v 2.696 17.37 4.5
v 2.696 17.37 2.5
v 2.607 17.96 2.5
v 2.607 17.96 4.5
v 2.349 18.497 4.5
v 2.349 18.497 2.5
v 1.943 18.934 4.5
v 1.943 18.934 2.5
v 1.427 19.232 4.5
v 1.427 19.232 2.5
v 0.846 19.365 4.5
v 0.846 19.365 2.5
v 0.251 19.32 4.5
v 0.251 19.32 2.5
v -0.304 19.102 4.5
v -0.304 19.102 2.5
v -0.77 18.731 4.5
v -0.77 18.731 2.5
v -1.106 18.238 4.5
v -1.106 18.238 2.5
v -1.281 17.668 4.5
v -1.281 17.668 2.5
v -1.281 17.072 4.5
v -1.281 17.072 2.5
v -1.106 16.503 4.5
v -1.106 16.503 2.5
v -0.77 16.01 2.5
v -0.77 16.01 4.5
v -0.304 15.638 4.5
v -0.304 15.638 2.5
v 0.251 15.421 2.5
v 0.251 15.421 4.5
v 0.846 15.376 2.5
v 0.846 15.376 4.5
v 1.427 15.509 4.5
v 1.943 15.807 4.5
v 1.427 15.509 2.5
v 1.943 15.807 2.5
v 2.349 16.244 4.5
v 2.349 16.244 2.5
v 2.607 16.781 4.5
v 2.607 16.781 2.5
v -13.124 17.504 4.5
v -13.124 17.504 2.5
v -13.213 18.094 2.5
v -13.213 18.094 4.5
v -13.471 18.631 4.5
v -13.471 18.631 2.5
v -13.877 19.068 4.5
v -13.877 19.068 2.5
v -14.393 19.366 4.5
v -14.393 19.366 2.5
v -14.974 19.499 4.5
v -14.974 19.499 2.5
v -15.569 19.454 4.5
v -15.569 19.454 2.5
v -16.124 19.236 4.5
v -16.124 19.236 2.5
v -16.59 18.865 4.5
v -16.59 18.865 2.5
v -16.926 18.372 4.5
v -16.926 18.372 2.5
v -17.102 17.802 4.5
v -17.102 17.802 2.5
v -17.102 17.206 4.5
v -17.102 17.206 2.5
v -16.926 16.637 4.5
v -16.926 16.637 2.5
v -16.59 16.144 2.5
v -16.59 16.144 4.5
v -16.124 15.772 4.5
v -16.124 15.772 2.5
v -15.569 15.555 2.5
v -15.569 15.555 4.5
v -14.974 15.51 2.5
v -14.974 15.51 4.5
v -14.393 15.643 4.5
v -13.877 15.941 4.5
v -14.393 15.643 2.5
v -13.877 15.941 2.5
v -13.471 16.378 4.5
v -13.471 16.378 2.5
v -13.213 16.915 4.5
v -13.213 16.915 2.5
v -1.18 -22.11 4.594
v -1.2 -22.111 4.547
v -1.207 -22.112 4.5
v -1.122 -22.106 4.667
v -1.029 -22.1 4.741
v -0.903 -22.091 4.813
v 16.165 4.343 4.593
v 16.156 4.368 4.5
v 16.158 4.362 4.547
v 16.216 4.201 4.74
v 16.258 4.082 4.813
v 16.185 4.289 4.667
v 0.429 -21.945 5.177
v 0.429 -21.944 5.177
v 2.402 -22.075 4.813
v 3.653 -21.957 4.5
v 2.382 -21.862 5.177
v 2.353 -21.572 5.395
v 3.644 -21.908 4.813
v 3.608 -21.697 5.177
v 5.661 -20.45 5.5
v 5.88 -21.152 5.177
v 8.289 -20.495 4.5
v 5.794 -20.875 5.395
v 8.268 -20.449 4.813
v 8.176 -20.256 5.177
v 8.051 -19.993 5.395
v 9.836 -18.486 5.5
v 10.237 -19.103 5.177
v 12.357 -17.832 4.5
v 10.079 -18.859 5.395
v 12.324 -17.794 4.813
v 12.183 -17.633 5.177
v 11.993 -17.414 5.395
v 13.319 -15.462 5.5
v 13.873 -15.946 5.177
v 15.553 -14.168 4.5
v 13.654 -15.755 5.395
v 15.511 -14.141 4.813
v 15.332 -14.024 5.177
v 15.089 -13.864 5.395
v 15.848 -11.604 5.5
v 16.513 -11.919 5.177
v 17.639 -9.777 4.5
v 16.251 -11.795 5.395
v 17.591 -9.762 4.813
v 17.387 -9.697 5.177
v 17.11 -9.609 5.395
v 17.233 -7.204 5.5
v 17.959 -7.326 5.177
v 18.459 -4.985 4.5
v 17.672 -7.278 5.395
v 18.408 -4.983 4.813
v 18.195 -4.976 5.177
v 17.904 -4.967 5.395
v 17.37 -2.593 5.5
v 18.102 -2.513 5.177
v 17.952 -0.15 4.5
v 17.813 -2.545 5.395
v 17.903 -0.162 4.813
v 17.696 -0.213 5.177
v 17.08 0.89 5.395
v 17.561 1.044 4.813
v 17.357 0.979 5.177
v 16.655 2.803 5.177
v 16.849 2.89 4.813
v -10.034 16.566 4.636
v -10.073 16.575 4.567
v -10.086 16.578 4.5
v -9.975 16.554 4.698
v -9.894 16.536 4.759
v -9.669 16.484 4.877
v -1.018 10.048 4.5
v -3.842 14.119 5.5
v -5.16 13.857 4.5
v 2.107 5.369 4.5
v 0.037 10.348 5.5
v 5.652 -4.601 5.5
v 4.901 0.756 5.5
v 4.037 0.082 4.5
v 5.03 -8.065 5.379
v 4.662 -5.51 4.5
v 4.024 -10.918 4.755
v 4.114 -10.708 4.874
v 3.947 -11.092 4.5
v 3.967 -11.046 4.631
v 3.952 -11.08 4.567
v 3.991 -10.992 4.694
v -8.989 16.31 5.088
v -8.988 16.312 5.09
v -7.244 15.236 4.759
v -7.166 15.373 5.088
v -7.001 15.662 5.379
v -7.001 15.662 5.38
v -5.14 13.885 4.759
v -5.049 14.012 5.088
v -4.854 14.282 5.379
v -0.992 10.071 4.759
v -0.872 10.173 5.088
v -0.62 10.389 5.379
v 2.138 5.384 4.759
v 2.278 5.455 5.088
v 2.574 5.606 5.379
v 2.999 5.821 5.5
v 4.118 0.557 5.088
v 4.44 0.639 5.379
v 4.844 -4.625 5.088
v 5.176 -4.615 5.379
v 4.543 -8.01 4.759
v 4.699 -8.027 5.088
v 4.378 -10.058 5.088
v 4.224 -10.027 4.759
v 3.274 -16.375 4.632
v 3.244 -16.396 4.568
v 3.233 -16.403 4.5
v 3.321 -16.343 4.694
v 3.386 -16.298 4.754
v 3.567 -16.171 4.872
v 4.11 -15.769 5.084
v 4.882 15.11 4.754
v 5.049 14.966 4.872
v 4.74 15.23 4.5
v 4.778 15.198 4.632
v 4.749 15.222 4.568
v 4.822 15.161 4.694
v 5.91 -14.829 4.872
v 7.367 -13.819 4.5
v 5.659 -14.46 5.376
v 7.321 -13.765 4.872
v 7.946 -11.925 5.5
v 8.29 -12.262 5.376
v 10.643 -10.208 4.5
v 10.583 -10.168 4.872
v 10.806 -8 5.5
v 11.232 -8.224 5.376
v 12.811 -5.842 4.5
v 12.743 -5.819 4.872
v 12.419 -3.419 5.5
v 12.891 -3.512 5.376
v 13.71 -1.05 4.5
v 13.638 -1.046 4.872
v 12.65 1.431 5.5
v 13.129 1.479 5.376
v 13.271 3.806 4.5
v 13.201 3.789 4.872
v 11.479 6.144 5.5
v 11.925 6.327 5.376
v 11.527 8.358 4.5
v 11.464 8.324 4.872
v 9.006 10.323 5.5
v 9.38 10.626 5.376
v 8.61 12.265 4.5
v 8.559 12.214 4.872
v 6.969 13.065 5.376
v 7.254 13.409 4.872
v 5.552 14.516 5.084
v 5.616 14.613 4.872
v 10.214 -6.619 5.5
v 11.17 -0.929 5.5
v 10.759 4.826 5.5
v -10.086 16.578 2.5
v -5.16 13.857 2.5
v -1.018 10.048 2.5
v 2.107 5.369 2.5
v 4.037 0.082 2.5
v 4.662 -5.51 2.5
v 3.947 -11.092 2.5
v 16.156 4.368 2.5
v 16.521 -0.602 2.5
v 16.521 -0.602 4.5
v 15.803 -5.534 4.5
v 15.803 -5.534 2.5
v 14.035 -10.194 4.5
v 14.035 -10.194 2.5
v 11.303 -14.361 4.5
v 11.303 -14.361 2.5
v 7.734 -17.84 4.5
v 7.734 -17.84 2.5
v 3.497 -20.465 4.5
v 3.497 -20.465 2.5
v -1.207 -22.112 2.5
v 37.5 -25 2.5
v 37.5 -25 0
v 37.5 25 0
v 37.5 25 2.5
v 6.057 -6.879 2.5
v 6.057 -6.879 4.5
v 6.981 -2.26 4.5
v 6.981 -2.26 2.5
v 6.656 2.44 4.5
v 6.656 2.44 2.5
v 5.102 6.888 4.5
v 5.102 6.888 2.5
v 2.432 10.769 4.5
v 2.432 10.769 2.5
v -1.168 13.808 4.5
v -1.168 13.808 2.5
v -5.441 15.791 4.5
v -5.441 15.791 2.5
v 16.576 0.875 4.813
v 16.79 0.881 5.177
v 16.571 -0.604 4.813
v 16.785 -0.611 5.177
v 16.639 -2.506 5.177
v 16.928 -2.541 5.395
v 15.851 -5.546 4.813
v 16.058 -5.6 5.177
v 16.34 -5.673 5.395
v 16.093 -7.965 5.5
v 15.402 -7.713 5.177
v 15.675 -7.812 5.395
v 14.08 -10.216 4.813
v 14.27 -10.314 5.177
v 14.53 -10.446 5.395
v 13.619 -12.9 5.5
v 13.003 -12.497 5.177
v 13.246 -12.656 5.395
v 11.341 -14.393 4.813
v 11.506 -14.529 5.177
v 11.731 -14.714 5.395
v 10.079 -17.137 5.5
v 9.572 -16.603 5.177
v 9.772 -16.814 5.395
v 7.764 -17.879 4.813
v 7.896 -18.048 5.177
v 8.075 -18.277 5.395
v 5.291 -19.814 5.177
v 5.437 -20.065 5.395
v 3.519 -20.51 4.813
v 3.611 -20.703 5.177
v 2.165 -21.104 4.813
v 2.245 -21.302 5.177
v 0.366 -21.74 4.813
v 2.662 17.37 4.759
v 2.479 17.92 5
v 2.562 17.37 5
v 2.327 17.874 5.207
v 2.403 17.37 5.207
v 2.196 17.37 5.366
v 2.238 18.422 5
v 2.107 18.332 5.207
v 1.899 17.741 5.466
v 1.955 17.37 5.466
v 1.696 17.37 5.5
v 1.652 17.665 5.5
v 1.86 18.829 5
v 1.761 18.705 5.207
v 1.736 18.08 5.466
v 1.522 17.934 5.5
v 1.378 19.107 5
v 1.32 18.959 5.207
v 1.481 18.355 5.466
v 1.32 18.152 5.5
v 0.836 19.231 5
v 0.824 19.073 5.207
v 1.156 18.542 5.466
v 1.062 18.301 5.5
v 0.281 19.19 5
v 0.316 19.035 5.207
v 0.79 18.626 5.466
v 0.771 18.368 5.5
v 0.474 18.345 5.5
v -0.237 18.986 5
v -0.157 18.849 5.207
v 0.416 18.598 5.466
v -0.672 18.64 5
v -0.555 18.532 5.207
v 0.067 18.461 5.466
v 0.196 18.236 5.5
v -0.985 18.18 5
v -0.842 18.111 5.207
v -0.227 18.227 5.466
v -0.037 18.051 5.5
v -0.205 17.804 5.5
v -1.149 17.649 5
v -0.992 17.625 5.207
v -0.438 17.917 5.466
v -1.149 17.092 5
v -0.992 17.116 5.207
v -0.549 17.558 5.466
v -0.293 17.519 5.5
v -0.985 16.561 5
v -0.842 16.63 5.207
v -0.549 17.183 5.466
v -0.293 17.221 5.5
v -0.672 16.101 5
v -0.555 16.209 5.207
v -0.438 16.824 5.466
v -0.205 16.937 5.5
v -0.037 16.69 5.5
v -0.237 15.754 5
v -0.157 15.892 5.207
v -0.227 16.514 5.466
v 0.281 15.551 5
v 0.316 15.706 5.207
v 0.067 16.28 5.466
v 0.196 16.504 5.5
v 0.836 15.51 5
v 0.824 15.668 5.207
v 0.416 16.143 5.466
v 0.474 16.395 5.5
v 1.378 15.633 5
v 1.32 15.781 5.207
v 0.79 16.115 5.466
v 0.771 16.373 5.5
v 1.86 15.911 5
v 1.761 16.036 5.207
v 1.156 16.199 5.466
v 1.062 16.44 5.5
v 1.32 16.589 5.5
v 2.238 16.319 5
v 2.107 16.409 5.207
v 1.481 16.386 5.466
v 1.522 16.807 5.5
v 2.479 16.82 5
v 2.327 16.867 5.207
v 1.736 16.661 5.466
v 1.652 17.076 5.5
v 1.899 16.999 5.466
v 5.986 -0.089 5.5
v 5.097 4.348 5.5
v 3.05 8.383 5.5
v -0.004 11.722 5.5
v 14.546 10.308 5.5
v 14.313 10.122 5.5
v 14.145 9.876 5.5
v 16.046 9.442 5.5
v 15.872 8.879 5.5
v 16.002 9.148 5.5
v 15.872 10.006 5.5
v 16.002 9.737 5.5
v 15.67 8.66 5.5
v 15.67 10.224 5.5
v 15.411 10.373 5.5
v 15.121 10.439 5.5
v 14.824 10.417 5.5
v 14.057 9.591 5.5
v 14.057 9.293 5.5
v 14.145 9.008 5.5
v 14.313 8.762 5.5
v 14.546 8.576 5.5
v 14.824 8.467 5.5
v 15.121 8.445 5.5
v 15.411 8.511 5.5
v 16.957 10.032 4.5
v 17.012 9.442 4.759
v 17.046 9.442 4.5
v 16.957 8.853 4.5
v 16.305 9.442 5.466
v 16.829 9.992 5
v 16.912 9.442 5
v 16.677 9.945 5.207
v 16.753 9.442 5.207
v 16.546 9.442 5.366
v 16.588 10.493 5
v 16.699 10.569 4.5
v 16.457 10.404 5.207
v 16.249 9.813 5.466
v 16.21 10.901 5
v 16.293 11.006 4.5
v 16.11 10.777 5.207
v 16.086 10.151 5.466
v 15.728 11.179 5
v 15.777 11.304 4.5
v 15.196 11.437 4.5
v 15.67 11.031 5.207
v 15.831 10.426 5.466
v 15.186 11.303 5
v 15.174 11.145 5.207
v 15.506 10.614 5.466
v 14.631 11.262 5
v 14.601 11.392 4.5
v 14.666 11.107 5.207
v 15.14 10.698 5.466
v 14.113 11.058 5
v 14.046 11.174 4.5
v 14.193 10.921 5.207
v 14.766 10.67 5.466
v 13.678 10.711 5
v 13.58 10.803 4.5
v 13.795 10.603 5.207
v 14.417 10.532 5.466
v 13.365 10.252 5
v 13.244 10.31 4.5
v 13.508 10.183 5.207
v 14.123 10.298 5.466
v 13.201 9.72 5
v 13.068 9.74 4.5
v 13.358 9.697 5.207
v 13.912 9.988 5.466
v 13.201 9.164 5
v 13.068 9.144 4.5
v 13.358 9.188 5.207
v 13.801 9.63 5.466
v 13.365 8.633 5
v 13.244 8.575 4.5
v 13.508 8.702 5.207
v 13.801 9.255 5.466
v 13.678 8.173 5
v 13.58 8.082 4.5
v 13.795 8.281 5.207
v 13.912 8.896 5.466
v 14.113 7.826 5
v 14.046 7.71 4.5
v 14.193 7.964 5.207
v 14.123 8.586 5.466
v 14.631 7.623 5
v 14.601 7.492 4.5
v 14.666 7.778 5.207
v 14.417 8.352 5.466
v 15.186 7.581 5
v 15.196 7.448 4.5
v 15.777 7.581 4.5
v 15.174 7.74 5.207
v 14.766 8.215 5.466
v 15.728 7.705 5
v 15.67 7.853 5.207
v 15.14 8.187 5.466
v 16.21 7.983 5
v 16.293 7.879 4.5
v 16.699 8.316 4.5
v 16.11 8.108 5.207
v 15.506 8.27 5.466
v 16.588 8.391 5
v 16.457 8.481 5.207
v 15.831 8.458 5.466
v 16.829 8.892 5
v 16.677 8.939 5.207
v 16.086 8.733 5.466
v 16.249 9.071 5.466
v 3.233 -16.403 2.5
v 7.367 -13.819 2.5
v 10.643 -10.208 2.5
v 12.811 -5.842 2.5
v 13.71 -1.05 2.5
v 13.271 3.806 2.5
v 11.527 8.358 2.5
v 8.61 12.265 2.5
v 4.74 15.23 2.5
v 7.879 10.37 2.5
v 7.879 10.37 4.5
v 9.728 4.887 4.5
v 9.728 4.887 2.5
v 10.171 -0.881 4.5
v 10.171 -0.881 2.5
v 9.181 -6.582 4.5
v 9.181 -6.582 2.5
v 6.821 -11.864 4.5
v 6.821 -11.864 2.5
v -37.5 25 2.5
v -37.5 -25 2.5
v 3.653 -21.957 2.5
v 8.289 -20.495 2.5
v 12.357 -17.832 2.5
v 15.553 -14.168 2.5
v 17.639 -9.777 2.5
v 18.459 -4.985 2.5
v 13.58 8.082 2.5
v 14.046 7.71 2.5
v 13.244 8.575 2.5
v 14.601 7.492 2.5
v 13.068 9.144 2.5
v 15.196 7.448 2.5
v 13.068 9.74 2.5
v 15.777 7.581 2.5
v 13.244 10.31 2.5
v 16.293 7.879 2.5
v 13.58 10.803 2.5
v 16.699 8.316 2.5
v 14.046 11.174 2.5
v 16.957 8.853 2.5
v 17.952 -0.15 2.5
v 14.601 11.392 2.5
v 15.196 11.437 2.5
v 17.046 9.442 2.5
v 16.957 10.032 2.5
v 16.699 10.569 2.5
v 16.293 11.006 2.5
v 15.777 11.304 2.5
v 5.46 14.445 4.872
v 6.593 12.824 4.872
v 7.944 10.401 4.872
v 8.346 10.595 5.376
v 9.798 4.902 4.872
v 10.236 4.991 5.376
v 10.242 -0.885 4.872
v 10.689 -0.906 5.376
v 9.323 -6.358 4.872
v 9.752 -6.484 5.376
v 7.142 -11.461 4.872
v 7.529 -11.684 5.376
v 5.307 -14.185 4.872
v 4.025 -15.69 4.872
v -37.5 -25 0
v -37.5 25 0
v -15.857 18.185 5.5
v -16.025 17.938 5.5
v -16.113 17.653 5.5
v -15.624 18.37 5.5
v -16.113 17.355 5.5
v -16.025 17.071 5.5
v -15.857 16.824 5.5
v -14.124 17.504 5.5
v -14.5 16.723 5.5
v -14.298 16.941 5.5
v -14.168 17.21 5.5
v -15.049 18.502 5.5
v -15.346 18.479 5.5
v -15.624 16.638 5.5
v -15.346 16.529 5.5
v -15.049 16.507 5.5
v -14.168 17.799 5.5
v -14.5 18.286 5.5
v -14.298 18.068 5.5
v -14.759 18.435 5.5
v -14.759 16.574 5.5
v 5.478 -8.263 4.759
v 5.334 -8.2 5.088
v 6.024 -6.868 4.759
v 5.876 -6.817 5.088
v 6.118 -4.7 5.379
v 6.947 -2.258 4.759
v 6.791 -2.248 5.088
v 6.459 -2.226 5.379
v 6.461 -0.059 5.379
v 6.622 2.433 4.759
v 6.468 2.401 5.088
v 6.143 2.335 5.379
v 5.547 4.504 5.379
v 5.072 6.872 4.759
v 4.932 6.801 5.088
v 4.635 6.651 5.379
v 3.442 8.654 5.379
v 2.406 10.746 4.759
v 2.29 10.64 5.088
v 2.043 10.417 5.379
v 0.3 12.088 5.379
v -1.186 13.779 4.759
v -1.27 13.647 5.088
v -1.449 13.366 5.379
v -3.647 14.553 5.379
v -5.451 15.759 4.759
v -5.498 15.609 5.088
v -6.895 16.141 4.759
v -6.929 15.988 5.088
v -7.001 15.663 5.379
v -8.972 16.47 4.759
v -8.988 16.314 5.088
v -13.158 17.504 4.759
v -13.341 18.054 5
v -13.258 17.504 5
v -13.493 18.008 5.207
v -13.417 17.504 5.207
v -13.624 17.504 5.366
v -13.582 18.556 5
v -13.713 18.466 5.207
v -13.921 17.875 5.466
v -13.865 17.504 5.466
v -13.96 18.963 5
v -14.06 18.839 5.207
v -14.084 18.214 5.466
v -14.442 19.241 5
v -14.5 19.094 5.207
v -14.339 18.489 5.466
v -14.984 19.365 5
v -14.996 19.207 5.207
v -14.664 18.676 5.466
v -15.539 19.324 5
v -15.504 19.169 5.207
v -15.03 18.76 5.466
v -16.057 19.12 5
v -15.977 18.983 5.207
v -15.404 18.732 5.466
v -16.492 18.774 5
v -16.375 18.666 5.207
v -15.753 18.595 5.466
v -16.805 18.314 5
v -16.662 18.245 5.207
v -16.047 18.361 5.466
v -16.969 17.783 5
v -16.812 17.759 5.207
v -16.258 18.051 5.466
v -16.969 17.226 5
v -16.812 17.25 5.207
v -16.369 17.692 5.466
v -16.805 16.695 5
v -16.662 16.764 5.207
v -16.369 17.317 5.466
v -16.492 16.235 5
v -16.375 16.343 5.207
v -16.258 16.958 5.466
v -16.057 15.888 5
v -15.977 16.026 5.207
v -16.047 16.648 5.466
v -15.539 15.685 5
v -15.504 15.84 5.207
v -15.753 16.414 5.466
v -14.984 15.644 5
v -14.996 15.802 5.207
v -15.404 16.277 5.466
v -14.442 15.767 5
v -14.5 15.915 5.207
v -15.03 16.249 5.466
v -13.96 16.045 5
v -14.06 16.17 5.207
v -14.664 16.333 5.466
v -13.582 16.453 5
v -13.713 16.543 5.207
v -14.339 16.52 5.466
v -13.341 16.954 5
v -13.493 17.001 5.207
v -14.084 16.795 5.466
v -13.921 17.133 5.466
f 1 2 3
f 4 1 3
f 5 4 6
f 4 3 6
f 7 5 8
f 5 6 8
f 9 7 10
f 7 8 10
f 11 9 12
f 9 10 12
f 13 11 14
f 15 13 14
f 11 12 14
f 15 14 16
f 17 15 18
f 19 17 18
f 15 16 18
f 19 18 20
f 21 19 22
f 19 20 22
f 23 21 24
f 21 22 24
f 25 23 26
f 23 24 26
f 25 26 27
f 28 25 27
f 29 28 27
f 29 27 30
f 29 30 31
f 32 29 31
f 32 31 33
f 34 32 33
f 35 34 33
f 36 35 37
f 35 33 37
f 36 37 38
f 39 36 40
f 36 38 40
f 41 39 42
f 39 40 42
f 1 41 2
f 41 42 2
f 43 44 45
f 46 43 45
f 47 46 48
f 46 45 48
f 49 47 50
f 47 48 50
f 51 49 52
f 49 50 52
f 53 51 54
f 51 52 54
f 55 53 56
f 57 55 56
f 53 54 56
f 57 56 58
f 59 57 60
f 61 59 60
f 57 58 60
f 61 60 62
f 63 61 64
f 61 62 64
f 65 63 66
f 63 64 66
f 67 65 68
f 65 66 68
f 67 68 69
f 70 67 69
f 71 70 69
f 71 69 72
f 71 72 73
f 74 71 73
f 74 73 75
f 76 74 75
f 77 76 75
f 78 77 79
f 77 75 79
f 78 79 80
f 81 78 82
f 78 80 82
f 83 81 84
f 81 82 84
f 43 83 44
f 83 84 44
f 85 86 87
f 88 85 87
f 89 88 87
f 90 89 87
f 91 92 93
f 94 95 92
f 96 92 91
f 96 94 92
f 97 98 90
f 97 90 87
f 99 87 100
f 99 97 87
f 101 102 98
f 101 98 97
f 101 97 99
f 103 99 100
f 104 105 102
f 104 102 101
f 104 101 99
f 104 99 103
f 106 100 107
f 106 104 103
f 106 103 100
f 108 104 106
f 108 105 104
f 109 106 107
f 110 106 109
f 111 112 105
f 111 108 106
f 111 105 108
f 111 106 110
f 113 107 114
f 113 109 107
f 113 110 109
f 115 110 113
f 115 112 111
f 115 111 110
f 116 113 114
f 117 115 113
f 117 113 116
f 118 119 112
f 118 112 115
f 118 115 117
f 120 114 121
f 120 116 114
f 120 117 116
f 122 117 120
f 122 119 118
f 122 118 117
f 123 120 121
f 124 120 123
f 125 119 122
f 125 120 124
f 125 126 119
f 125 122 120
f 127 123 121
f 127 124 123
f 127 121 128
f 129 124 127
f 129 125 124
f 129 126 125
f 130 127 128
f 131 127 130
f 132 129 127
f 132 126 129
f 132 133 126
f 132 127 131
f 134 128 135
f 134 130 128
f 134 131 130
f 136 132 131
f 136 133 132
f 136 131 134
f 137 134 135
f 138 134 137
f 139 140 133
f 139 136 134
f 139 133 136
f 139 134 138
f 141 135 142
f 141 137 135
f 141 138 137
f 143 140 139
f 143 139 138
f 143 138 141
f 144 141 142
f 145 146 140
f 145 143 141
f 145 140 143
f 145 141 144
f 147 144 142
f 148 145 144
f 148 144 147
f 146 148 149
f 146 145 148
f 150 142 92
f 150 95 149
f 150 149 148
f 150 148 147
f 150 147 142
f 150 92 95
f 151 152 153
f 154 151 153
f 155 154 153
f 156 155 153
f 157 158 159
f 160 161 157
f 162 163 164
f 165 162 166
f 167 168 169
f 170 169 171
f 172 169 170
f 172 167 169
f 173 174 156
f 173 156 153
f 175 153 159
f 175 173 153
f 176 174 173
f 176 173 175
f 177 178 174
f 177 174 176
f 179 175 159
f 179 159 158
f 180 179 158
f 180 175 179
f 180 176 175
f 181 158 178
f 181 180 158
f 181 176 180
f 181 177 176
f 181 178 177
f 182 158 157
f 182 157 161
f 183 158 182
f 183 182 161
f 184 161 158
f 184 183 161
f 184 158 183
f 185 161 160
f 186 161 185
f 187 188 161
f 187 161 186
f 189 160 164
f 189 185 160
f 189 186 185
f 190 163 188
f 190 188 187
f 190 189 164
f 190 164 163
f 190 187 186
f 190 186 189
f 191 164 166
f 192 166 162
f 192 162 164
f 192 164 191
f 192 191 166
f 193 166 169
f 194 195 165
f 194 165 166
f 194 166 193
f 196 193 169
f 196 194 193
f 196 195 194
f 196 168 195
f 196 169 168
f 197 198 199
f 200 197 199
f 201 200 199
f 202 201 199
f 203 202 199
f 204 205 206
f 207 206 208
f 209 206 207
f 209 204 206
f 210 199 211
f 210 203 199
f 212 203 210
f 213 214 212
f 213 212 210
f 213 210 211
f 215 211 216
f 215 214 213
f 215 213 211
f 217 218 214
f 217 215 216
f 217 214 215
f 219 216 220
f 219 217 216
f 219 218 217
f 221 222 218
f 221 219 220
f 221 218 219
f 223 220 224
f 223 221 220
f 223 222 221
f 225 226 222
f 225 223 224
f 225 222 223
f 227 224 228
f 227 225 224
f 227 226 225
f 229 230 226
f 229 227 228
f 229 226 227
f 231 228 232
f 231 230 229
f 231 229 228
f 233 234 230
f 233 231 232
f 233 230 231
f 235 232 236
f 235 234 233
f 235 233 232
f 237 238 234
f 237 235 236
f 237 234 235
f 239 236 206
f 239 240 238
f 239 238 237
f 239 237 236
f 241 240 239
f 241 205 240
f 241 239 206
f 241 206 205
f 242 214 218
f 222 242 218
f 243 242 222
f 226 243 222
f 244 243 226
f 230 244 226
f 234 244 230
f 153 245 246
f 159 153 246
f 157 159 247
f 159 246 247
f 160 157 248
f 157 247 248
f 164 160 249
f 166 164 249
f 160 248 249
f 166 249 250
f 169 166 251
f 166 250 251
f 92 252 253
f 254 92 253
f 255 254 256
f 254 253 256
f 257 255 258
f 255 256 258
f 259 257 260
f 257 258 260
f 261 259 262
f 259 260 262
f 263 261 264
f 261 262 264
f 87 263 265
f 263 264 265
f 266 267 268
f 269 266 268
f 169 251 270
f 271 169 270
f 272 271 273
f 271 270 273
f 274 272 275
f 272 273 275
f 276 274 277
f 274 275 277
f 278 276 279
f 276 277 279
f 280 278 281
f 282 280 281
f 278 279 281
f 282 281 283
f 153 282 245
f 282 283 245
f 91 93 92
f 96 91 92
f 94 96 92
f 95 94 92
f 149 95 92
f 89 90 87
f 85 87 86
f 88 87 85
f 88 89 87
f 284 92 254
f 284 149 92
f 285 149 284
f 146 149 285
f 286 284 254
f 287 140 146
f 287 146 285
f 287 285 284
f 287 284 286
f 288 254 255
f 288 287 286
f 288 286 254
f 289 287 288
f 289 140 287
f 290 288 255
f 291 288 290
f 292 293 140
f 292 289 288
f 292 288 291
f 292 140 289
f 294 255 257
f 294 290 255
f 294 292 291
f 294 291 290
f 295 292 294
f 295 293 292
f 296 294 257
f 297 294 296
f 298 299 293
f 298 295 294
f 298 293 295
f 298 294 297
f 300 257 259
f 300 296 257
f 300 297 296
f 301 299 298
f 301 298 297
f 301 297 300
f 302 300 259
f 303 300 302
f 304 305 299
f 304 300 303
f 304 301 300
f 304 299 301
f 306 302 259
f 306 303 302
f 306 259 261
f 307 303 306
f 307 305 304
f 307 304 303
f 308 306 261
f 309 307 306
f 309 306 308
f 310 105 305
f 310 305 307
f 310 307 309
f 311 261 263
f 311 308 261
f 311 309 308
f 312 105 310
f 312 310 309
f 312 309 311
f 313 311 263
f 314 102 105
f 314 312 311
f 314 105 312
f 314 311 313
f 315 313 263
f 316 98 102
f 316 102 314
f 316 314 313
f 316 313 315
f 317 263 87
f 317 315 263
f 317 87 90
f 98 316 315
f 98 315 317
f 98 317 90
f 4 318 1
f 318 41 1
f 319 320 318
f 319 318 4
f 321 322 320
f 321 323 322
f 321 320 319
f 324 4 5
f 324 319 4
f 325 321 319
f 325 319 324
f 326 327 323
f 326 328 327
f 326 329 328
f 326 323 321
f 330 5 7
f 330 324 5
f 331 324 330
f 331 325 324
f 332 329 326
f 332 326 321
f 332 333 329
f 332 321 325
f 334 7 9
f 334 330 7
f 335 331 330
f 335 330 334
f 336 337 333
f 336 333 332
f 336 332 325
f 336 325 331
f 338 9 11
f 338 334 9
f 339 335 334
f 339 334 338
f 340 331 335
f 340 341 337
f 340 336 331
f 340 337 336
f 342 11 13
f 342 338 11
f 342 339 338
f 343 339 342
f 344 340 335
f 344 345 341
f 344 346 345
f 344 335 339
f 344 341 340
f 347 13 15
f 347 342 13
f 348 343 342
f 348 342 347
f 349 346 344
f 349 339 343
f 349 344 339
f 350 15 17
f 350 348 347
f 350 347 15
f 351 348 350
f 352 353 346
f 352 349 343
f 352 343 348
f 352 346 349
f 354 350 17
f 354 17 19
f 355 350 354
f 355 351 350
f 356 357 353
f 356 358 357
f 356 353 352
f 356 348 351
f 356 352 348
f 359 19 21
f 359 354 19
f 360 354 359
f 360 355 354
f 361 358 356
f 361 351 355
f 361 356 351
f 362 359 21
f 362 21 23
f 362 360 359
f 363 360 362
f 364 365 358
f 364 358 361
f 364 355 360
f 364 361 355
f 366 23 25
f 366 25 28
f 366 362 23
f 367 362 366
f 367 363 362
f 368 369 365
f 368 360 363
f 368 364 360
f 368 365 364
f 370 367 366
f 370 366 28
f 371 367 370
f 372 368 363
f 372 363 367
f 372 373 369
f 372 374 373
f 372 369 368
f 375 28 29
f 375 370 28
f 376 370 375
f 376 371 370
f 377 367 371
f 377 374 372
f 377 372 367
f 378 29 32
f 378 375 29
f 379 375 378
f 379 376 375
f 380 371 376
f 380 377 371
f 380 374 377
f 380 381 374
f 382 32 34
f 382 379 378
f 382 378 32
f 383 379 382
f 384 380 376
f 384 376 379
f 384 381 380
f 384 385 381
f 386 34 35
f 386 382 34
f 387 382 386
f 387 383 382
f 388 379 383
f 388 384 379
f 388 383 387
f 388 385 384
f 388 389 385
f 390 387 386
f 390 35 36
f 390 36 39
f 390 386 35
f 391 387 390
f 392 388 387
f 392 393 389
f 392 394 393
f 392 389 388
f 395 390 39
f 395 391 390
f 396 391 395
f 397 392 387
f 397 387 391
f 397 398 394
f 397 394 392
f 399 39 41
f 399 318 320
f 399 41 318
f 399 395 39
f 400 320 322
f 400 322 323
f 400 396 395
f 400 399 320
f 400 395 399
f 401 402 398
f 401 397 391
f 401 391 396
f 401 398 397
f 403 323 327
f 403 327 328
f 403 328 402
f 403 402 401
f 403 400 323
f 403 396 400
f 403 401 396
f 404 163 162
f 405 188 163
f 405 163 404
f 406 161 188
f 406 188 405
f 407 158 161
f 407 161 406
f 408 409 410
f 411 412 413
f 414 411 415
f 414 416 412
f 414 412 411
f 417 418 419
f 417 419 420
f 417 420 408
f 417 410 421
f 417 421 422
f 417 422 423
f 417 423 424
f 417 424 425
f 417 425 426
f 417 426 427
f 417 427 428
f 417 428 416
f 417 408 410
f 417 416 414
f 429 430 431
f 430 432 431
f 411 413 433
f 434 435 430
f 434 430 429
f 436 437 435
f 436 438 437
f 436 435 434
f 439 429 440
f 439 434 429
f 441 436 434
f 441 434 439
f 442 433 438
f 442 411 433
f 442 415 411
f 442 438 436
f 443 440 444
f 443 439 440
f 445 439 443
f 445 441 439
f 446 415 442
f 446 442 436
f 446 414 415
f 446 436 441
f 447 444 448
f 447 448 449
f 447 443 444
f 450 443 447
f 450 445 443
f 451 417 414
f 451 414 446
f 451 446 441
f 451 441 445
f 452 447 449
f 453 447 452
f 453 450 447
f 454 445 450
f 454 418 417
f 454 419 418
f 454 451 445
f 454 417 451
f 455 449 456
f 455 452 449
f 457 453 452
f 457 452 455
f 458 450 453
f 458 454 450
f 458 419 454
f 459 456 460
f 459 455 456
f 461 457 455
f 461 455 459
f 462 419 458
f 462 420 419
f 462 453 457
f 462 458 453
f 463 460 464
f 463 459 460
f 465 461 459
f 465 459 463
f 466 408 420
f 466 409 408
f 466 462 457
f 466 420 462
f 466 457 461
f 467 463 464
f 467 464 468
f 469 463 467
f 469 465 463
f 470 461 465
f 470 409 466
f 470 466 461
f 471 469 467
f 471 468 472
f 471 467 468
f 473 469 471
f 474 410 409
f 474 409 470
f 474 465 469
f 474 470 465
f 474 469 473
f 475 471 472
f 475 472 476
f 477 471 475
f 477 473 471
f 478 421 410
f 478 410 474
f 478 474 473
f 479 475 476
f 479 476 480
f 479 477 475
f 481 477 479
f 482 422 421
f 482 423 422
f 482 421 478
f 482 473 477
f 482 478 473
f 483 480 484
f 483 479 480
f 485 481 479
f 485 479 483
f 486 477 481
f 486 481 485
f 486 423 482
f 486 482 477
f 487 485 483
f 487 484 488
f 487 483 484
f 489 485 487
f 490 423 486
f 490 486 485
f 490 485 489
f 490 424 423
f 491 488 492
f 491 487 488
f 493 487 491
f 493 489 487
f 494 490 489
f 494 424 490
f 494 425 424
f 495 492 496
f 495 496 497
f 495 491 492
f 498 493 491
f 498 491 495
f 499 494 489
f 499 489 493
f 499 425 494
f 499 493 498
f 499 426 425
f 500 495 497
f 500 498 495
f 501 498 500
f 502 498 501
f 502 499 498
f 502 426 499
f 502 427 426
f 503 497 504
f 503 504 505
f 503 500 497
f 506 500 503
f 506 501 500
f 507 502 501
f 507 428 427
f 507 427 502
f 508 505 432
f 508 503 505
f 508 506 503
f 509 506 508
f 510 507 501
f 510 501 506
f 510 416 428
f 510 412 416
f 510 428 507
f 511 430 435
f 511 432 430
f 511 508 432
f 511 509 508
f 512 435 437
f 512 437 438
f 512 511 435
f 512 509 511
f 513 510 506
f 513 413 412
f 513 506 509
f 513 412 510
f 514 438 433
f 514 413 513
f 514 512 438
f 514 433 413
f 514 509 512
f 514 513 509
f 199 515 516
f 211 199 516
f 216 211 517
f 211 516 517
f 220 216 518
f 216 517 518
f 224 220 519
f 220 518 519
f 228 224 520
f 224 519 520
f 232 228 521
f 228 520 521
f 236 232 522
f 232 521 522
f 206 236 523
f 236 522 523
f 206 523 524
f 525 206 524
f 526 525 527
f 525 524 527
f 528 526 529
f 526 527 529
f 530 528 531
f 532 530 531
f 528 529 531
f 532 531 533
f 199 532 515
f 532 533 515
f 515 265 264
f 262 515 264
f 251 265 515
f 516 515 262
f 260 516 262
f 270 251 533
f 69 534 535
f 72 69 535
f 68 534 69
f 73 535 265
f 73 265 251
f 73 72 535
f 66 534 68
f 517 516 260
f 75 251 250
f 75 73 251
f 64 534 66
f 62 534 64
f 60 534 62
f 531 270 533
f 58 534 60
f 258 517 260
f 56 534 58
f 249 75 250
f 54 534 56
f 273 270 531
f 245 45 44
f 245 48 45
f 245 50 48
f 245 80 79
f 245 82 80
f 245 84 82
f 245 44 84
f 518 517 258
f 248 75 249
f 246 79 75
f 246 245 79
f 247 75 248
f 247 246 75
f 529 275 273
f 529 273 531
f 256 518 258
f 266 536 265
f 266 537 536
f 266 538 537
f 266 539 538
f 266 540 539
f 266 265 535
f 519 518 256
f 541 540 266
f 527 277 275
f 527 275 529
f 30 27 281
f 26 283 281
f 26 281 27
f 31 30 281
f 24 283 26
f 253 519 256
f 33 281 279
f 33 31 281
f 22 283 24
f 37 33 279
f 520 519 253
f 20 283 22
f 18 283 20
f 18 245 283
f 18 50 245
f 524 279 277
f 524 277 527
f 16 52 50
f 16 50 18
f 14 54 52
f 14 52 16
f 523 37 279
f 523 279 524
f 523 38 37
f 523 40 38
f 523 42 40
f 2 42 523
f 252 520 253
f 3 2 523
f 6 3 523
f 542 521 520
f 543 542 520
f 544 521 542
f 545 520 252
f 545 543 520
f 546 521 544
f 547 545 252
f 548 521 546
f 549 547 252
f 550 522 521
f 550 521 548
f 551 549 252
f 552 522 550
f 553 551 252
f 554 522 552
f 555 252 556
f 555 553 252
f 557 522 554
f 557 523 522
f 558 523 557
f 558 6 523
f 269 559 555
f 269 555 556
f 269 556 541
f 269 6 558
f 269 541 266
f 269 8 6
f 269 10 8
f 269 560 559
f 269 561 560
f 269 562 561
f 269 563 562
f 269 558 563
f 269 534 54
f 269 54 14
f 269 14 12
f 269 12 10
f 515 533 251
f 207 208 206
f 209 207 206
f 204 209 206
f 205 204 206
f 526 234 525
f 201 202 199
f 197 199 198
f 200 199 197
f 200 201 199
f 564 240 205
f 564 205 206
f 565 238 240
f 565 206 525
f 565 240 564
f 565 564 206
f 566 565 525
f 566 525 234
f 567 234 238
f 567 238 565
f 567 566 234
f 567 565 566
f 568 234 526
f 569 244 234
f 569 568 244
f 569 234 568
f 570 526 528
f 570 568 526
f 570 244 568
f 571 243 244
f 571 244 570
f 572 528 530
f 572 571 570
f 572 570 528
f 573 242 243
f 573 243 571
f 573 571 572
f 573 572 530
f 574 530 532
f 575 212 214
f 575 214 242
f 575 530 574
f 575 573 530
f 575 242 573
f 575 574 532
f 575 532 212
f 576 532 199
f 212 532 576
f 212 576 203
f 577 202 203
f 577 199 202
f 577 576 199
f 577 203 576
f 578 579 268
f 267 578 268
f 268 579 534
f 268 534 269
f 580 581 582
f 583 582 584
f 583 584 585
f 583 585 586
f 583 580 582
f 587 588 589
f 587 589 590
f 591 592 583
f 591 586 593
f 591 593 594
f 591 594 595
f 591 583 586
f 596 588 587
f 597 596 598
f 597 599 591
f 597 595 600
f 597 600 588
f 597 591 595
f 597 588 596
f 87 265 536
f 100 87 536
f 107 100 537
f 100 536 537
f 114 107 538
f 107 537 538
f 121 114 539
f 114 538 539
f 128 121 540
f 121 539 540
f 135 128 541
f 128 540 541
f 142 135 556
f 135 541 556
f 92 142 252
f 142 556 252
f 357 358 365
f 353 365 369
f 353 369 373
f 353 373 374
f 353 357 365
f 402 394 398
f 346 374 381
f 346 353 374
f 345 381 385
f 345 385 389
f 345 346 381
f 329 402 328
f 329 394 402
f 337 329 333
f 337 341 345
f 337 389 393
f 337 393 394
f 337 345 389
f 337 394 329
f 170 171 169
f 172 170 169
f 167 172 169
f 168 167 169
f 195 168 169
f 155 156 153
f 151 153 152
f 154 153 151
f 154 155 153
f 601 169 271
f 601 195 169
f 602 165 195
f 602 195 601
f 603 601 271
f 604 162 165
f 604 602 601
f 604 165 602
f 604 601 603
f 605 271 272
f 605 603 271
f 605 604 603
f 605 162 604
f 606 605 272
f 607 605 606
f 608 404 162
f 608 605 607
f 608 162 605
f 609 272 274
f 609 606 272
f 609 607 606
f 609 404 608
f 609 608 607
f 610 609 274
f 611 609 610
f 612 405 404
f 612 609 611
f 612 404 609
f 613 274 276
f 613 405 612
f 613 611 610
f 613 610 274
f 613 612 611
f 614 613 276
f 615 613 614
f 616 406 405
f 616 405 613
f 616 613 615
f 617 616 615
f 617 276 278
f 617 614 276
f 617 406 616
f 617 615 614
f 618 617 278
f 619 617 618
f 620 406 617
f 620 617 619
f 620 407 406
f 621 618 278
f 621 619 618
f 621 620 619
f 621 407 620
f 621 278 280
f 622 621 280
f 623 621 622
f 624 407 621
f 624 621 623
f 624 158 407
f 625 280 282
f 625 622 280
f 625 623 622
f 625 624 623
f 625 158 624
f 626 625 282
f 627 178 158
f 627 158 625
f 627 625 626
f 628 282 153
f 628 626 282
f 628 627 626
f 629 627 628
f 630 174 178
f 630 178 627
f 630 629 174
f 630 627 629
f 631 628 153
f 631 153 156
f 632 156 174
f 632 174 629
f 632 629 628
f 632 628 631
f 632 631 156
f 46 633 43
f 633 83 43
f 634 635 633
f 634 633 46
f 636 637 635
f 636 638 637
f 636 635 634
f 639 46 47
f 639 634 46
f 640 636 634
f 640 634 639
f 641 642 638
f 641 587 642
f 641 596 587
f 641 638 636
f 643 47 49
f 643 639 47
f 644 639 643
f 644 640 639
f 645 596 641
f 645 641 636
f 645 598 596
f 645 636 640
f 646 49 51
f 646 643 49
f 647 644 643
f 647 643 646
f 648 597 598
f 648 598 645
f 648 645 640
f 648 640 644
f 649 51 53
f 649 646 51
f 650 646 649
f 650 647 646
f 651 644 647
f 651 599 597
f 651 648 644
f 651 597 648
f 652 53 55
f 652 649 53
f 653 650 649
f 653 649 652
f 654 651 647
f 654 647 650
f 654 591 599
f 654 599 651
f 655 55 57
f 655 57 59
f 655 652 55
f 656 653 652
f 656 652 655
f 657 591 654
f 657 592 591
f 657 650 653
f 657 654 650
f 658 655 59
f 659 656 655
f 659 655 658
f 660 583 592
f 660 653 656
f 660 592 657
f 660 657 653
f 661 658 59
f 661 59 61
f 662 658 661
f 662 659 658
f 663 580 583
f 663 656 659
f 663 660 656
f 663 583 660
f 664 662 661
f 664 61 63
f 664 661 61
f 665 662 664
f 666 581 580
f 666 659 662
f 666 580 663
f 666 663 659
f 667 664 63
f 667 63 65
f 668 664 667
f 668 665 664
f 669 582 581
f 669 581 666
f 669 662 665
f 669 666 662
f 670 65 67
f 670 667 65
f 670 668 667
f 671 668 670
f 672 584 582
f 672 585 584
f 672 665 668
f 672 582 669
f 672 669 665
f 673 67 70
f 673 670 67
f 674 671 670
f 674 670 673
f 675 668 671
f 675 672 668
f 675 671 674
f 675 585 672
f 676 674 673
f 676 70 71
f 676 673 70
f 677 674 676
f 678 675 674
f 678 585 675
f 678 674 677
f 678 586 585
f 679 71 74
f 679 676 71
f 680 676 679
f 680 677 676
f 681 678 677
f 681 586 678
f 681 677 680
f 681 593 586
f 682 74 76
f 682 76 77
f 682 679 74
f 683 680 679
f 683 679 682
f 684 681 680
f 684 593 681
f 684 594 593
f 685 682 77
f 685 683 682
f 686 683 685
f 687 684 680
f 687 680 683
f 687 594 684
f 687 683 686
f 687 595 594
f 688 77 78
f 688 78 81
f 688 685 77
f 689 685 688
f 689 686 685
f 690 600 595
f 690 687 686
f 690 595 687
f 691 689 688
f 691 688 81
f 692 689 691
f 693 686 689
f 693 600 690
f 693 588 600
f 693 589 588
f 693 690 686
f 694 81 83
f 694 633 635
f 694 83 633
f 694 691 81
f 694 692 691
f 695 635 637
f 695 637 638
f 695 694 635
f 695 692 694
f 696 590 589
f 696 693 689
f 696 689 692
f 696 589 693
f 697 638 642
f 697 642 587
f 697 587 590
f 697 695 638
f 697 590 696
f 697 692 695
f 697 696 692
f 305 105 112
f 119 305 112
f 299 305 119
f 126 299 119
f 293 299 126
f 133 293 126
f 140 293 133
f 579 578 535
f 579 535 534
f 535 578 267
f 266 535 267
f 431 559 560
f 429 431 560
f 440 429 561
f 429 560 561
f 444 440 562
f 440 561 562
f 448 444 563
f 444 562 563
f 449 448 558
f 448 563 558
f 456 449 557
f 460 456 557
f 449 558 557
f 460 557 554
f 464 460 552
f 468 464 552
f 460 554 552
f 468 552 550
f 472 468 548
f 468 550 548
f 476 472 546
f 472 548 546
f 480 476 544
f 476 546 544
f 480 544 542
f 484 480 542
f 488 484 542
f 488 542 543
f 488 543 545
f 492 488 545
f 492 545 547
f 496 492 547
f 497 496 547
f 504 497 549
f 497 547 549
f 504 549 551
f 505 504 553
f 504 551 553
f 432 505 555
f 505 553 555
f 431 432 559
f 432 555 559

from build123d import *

# Parameters (mm, degrees)
F0_W     = 75
F0_H     = 50
F1_DEPTH = 2.5
F2_R     = 2
F3_DEPTH = 3
F4_R     = 1


with BuildPart() as f1:
    # F0 (on Top) → F1 (new body)
    with BuildSketch(Plane.XY):
        Rectangle(F0_W, F0_H)
    extrude(amount=F1_DEPTH)

    # F2 (on face) → F3 (join)
    with BuildSketch(Plane.XY.offset(2.5)):
        with BuildLine():
            ThreePointArc((16.155995, 4.368282), (12.782578, -12.351987), (-1.206584, -22.111632))
            ThreePointArc((-1.206584, -22.111632), (15.552751, -14.168357), (16.155995, 4.368282))
        make_face()
        with BuildLine():
            ThreePointArc((4.739505, 15.229804), (10.170701, -0.881285), (3.233162, -16.403387))
            ThreePointArc((3.233162, -16.403387), (13.70995, -1.049821), (4.739505, 15.229804))
        make_face()
        with BuildLine():
            ThreePointArc((-10.086076, 16.577584), (2.107223, 5.36856), (3.946693, -11.091548))
            ThreePointArc((3.946693, -11.091548), (5.102492, 6.887651), (-10.086076, 16.577584))
        make_face()
        with Locations((-15.12387, 17.504403)):
            Circle(F2_R)
        with Locations((0.696165, 17.370397)):
            Circle(F2_R)
        with Locations((15.046059, 9.442278)):
            Circle(F2_R)
    extrude(amount=F3_DEPTH)

    # F4
    f4_edges = [f1.edges().sort_by_distance(p)[0] for p in [
        (-17.12387, 17.504403, 5.5),
        (-1.303835, 17.370397, 5.5),
        (13.046059, 9.442278, 5.5),
        (15.552751, -14.168357, 5.5),
        (12.782578, -12.351987, 5.5),
        (13.70995, -1.049821, 5.5),
        (10.170701, -0.881285, 5.5),
        (5.102492, 6.887651, 5.5),
        (2.107223, 5.36856, 5.5),
    ]]
    fillet(f4_edges, radius=F4_R)


solid = f1.part
